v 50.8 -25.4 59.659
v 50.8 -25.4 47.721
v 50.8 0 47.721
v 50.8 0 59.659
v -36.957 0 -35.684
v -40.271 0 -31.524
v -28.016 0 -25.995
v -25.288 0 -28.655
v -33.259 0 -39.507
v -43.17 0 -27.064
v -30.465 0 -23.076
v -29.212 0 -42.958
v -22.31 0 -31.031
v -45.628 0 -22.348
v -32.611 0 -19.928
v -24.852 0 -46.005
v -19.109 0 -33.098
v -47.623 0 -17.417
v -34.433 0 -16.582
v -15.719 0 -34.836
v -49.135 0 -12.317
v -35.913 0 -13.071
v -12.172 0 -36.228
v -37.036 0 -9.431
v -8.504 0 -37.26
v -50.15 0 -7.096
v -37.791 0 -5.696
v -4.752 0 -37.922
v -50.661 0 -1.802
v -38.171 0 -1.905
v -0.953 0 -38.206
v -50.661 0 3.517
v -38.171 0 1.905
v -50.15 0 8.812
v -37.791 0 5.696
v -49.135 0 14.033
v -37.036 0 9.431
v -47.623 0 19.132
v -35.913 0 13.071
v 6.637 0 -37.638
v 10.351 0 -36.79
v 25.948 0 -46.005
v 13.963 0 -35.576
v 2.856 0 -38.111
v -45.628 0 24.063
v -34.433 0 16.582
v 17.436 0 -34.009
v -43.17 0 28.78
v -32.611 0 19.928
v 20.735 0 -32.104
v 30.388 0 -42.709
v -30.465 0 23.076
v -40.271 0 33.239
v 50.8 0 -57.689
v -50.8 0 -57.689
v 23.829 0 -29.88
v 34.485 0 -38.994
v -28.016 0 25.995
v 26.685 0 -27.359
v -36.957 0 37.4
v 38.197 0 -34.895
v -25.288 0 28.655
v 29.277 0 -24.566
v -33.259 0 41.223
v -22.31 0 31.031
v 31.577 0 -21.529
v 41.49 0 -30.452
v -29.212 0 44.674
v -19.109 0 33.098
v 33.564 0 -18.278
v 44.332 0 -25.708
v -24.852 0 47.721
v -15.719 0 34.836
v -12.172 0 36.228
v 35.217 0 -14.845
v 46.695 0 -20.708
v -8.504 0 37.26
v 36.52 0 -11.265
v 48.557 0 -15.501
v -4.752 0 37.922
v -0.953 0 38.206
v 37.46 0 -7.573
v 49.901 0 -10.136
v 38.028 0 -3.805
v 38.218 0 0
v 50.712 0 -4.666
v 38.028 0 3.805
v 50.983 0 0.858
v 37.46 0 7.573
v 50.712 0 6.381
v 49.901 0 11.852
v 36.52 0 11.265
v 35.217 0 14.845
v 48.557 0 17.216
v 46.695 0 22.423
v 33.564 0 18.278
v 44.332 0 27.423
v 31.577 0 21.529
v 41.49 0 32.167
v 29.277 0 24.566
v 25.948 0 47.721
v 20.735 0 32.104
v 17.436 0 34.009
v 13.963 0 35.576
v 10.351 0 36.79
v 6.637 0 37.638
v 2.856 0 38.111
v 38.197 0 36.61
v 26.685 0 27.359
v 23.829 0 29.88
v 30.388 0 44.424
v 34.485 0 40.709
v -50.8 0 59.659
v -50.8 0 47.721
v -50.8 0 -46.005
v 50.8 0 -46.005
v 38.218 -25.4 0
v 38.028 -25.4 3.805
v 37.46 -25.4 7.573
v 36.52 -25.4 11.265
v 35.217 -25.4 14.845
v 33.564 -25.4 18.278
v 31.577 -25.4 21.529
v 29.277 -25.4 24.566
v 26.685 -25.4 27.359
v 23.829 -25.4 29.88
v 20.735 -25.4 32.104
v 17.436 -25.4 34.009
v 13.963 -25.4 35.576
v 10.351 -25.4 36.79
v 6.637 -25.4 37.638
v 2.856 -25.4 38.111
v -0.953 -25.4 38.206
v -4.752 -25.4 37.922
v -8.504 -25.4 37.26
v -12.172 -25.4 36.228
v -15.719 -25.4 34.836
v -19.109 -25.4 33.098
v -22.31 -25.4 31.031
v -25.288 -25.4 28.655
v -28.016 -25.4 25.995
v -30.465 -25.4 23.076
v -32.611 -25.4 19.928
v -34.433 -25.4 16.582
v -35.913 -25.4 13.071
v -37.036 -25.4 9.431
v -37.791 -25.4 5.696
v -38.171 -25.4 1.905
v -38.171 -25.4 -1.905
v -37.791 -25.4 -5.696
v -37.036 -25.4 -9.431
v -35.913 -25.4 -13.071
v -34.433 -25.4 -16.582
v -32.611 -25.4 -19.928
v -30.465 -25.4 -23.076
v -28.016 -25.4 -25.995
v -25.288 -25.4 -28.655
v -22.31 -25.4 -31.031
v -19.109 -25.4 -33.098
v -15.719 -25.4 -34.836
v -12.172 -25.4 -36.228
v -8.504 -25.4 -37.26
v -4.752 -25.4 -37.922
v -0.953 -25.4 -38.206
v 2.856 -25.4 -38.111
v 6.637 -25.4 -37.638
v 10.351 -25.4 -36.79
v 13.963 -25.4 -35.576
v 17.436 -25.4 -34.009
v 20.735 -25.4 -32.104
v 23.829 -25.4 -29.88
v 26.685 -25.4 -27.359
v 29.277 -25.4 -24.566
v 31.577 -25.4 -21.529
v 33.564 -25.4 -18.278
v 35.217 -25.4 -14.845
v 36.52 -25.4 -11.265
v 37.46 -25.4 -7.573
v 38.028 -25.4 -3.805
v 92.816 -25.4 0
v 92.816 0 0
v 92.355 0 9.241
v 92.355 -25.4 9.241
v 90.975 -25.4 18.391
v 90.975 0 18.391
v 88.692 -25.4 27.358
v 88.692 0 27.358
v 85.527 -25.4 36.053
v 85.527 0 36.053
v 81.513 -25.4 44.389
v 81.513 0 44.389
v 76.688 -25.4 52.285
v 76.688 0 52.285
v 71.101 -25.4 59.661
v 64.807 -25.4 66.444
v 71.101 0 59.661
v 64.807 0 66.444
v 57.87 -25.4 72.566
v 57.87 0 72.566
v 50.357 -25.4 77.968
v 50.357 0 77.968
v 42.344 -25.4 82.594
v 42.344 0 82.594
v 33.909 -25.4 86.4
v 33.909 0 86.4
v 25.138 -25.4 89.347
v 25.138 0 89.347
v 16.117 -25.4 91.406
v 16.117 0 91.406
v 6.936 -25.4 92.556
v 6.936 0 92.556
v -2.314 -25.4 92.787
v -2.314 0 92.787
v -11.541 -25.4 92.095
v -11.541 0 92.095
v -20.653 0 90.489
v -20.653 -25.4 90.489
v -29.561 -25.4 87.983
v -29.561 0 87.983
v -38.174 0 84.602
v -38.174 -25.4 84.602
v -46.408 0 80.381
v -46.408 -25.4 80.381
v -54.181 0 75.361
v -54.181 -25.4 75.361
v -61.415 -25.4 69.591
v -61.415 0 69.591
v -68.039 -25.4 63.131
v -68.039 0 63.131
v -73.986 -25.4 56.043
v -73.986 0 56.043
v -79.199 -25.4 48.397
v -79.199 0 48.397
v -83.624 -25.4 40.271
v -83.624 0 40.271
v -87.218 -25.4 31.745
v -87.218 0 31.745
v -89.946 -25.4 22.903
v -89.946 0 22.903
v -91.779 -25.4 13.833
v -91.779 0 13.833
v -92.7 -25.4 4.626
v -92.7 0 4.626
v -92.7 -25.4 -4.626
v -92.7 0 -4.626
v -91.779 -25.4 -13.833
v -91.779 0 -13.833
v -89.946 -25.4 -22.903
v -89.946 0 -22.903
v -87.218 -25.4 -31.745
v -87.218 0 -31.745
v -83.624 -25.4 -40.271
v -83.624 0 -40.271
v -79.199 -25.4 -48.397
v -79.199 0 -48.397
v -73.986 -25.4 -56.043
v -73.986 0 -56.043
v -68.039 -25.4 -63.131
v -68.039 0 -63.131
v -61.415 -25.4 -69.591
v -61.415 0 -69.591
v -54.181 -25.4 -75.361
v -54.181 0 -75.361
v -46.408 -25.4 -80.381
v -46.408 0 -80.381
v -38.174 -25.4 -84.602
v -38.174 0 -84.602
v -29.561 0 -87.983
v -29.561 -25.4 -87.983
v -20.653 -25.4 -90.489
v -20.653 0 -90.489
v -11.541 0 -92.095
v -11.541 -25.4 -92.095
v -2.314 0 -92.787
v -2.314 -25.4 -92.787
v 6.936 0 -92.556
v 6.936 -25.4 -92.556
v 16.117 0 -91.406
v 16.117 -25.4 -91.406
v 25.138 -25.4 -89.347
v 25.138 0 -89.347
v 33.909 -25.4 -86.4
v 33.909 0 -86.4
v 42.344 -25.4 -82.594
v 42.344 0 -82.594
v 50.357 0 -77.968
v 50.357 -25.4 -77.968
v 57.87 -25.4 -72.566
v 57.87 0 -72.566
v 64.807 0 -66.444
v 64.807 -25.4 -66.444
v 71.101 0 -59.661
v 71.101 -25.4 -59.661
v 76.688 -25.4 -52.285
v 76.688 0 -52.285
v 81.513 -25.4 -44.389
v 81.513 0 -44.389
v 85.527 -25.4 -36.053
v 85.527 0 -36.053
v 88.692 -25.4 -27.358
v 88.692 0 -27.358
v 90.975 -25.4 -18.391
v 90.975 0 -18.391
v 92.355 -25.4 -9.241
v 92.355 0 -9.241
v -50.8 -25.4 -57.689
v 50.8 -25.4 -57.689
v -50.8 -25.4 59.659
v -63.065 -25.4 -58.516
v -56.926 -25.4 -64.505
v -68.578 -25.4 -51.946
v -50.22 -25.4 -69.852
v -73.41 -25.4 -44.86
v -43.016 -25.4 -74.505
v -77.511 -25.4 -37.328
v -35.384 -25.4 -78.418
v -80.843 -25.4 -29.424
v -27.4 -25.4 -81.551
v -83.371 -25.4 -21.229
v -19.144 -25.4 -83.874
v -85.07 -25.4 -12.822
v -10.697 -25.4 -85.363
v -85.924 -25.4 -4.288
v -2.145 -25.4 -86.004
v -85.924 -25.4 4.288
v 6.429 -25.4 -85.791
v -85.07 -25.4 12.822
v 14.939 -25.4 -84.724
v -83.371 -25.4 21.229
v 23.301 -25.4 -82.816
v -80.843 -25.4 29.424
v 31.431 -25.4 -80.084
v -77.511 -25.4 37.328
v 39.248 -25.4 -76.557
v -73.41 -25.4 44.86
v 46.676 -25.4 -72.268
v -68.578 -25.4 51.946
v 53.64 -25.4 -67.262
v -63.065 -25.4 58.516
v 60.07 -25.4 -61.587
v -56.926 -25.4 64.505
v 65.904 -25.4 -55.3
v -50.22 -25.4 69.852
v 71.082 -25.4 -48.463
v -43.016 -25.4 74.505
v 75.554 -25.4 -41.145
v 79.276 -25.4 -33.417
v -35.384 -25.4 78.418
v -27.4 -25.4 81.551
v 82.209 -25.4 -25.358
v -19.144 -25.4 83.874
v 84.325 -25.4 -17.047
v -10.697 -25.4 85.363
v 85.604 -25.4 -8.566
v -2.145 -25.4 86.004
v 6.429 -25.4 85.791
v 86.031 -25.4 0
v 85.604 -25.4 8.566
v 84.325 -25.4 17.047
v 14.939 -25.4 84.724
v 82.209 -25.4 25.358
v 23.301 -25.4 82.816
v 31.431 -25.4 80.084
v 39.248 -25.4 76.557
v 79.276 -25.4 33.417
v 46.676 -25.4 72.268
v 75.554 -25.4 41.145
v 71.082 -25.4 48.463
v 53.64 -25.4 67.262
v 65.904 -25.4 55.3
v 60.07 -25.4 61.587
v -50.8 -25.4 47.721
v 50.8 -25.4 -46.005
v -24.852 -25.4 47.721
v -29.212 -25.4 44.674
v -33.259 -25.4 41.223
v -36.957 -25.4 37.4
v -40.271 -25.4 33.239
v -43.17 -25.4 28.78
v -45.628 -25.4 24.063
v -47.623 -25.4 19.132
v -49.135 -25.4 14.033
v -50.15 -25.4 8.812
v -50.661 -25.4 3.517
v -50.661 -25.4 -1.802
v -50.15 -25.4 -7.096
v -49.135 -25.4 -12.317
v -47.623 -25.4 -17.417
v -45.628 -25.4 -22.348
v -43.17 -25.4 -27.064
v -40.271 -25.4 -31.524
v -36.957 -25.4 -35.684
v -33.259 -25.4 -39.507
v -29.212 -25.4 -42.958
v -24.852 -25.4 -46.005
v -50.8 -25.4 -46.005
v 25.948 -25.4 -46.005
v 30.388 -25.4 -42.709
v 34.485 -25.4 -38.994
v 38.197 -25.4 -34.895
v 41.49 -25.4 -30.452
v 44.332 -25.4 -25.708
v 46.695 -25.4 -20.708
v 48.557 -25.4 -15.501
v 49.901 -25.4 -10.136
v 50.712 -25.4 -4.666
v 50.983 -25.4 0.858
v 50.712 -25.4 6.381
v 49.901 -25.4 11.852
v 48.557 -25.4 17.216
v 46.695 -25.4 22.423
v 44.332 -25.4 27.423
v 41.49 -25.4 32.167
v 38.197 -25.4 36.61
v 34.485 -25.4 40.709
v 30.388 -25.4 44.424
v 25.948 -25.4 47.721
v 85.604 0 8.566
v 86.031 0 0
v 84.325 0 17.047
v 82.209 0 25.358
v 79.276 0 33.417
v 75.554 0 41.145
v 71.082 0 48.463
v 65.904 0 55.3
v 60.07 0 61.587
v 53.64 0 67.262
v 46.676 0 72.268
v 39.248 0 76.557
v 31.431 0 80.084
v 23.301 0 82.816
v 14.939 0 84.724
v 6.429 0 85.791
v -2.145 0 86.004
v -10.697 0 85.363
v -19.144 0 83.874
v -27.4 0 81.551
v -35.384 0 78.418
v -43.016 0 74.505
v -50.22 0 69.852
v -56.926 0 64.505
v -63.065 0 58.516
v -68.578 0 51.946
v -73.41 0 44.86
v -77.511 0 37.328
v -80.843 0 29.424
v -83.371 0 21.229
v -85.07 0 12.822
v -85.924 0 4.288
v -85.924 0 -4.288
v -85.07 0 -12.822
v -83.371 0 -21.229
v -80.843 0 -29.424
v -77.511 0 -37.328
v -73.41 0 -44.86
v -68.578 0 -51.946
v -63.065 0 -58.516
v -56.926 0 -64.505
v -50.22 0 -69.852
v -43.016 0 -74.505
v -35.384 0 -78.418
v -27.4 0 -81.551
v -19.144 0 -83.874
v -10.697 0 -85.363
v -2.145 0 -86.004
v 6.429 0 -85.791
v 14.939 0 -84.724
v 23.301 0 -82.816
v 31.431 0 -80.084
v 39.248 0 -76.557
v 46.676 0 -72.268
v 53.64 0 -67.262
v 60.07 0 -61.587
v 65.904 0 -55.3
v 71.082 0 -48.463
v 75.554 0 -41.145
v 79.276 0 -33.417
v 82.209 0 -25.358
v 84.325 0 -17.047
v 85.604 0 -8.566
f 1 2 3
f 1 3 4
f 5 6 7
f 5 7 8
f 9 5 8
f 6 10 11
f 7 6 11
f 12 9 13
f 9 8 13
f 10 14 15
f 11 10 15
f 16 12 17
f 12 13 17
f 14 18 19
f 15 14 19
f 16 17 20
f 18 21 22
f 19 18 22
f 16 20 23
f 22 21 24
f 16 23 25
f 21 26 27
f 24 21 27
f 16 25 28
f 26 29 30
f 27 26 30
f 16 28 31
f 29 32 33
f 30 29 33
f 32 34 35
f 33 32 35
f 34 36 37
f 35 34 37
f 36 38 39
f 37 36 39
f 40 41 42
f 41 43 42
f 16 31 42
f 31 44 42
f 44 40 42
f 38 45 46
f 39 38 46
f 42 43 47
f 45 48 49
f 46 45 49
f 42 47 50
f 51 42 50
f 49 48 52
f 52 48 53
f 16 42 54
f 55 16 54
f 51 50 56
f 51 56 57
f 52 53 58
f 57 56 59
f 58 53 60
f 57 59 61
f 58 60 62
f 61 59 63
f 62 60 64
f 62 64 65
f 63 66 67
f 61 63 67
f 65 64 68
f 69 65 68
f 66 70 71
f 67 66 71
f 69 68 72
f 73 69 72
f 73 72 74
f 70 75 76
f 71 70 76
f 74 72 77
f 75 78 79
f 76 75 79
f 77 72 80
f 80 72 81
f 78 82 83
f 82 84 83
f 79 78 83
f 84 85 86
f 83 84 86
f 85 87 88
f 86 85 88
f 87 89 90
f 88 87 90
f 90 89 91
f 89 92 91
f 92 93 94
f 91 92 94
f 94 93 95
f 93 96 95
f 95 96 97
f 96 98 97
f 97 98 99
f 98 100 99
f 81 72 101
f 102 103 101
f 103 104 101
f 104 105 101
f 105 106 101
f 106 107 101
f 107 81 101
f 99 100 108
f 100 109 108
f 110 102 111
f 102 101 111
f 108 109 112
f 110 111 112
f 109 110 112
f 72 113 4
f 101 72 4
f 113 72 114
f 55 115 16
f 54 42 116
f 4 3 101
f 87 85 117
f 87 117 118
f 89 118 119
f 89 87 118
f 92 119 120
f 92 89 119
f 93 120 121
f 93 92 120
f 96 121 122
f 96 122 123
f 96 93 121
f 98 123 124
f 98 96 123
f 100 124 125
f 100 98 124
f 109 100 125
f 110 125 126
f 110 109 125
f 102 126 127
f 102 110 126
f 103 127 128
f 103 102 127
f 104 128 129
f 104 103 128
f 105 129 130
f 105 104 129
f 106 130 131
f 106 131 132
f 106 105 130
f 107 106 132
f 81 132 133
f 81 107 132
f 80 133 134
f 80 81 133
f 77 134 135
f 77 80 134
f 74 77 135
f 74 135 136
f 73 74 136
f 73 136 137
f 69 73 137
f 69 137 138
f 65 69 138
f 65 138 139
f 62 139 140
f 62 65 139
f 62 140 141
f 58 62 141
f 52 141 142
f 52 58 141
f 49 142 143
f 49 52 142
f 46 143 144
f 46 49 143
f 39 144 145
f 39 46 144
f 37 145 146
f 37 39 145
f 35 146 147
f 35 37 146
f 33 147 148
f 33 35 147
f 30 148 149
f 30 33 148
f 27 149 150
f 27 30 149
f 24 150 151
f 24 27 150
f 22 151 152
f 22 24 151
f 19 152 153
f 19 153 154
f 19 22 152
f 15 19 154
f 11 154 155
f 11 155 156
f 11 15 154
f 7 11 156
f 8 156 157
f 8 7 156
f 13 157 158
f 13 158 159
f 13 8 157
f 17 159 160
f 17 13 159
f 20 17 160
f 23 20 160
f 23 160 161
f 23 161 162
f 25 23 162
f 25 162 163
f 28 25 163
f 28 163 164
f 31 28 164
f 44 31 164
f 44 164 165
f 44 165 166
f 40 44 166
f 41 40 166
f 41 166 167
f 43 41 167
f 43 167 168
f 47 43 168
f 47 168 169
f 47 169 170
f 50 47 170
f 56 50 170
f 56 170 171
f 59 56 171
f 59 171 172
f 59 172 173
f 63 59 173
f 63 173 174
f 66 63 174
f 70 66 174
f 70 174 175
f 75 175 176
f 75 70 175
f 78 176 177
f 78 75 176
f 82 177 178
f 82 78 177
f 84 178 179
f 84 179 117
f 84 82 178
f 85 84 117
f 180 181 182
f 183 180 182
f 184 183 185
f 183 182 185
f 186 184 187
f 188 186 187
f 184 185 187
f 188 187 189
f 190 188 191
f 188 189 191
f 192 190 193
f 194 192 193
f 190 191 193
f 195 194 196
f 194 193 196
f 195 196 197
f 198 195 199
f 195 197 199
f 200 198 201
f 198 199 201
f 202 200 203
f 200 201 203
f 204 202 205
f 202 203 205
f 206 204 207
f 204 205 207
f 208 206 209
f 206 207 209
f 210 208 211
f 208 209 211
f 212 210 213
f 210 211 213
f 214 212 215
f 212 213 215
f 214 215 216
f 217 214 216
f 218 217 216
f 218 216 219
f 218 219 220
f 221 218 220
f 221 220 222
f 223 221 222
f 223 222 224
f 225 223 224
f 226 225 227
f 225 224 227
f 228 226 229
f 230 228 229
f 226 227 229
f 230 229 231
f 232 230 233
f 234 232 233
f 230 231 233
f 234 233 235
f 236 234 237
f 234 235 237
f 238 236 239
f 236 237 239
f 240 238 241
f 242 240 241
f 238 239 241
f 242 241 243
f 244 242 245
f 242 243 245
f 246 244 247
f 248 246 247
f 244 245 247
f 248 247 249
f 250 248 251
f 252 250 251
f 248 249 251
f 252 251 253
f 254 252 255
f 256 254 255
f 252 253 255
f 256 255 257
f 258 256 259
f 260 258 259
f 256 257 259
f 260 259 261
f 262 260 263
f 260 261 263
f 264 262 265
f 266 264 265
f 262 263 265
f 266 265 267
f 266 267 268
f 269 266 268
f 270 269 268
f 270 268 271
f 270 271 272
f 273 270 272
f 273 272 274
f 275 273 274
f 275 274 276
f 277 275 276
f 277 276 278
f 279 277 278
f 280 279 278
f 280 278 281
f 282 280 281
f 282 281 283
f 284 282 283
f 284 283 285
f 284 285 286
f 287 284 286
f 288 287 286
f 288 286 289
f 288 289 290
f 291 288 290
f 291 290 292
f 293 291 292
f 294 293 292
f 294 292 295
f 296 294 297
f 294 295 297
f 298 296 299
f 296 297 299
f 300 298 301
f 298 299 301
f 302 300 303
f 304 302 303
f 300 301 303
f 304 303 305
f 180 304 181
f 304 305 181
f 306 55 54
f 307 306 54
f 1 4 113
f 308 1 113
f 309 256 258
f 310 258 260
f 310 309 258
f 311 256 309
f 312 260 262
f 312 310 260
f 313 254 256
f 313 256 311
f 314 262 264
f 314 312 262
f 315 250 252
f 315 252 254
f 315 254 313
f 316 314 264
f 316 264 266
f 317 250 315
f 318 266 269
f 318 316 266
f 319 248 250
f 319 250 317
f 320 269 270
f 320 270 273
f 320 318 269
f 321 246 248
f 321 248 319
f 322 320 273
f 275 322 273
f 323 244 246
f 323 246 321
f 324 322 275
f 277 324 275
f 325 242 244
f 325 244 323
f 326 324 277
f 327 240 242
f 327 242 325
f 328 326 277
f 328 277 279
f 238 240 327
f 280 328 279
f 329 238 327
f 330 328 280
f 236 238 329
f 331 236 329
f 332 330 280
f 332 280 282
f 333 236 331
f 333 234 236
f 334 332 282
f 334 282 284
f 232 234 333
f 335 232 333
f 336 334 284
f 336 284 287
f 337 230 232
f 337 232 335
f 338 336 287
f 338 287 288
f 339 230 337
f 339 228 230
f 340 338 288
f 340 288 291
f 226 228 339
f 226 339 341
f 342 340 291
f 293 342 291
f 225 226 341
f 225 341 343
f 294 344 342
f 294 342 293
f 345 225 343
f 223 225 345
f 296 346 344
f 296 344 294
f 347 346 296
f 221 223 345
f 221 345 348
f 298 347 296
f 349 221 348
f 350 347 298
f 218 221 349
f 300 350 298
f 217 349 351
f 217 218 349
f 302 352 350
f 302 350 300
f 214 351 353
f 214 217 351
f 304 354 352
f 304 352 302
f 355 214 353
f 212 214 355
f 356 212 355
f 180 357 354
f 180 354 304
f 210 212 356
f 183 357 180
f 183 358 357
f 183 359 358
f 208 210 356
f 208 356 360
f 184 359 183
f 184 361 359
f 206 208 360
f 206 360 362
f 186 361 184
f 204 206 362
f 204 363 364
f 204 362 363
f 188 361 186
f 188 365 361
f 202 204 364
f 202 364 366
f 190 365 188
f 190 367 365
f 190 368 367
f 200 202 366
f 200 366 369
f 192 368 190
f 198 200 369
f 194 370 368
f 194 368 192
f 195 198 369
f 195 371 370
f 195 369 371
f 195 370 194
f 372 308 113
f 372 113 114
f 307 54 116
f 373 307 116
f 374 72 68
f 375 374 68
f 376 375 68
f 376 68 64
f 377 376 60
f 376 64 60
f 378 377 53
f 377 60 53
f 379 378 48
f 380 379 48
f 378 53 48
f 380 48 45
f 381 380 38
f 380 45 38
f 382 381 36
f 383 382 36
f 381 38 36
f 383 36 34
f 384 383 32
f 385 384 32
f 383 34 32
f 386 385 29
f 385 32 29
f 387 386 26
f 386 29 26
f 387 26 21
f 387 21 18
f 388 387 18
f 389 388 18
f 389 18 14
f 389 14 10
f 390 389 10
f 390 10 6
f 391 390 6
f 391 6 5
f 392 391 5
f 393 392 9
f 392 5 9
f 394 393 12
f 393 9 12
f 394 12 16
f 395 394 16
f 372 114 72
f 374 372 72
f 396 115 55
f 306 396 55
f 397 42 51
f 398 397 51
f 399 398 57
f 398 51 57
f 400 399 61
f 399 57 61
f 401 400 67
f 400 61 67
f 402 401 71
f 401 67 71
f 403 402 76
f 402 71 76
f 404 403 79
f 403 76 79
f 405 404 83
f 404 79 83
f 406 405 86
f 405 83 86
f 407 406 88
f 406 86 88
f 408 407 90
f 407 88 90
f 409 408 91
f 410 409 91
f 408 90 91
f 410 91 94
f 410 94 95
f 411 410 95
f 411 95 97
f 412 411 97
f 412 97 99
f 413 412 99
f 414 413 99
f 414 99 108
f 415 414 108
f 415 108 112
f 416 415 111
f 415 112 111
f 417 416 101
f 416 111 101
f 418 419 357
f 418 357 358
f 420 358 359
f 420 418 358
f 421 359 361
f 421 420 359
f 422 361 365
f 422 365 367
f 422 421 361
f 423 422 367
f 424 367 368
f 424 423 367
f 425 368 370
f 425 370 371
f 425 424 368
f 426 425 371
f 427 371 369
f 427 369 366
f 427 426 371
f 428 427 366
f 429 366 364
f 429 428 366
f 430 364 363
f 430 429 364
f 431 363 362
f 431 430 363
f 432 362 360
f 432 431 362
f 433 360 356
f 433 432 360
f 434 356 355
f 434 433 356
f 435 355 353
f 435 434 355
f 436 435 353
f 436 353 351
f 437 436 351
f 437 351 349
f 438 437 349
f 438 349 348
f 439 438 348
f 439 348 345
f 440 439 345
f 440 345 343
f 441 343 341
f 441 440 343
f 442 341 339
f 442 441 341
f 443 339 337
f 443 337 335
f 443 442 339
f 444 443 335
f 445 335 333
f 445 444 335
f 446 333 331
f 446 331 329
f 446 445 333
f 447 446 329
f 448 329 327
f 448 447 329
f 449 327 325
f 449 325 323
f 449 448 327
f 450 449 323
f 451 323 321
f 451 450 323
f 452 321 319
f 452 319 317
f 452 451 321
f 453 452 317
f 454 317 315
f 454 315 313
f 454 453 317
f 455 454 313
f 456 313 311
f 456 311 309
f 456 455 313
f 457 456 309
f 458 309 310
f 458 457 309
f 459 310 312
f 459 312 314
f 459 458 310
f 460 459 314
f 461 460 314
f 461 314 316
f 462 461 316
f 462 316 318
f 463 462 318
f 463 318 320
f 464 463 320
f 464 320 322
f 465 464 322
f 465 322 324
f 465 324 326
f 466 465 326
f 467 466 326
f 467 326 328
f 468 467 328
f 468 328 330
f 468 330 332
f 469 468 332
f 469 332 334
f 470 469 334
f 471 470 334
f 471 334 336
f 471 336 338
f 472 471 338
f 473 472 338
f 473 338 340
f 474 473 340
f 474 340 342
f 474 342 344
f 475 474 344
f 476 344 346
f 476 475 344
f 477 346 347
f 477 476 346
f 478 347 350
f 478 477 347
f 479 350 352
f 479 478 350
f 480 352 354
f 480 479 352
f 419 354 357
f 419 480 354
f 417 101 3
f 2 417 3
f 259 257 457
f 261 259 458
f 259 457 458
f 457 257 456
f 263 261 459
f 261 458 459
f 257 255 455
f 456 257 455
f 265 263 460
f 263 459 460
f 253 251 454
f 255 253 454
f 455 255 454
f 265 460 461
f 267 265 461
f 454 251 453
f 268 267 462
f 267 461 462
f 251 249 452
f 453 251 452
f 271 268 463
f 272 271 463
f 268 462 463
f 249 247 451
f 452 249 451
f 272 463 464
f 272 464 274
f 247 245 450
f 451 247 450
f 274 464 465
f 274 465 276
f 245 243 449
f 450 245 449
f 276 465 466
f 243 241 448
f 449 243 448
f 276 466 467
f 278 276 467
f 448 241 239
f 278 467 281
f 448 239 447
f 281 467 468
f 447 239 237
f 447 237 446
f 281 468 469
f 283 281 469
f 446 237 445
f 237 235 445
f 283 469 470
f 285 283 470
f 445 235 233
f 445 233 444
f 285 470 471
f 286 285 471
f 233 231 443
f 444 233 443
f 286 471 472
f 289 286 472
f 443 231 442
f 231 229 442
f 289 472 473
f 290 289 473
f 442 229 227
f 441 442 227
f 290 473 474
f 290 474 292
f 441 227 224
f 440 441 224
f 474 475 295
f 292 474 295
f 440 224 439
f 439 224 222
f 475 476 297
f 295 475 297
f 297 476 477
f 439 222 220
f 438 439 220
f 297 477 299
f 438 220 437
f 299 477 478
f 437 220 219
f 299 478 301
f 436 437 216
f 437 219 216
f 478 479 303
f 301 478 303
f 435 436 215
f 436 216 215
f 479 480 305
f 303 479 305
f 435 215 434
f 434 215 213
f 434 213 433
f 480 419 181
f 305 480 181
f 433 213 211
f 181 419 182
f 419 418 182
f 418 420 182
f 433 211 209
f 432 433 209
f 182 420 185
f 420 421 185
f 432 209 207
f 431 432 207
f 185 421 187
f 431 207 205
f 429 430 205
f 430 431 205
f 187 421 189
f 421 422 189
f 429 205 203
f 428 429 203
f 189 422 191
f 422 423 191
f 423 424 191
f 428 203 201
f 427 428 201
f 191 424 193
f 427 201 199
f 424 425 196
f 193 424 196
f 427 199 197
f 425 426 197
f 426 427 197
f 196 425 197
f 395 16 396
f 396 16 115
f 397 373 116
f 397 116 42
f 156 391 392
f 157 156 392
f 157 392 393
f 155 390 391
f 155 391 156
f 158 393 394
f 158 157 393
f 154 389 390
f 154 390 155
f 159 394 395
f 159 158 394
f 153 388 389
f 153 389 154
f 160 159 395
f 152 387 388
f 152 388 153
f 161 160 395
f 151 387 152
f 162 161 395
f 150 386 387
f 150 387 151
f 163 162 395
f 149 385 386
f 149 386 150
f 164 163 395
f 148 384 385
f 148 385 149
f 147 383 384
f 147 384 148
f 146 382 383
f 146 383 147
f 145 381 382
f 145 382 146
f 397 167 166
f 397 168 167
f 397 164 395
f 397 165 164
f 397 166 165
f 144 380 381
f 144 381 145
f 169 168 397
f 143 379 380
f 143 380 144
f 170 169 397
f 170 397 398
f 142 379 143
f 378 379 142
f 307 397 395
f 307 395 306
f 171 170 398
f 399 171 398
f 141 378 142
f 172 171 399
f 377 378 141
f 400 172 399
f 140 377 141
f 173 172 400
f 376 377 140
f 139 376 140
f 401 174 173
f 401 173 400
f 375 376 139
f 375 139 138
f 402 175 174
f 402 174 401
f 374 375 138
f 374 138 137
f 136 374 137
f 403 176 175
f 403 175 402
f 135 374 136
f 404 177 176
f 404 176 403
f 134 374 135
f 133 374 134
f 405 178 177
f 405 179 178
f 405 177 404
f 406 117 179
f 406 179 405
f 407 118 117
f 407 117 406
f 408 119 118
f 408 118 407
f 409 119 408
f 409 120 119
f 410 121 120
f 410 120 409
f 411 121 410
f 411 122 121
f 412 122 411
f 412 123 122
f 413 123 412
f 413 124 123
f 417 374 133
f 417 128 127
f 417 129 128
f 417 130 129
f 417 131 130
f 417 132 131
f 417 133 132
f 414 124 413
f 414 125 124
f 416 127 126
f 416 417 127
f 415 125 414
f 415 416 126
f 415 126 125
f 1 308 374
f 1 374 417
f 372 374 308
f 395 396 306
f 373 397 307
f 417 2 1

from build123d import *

# Parameters (mm, degrees)
F0_R     = 92.815736
F0_R_2   = 86.031156
F0_R_3   = 38.21813
F1_DEPTH = 25.4


with BuildPart() as f1:
    # F0 (on Front) → F1 (new body)
    with BuildSketch(Plane.XZ):
        Circle(F0_R)
        Circle(F0_R_2, mode=Mode.SUBTRACT)
        with BuildLine():
            Line((50.8, 59.658739), (-50.8, 59.658739))
            Line((-50.8, 59.658739), (-50.8, 47.720739))
            Line((-50.8, 47.720739), (-24.852002, 47.720739))
            ThreePointArc((-24.852002, 47.720739), (-50.724671, 0.857739), (-24.852002, -46.005261))
            Line((-24.852002, -46.005261), (-50.8, -46.005261))
            Line((-50.8, -46.005261), (-50.8, -57.68926))
            Line((-50.8, -57.68926), (50.8, -57.68926))
            Line((50.8, -57.68926), (50.8, -46.005261))
            Line((50.8, -46.005261), (25.947996, -46.005261))
            ThreePointArc((25.947996, -46.005261), (50.98282, 0.857739), (25.947996, 47.720739))
            Line((25.947996, 47.720739), (50.8, 47.720739))
            Line((50.8, 47.720739), (50.8, 59.658739))
        make_face()
        Circle(F0_R_3, mode=Mode.SUBTRACT)
    extrude(amount=F1_DEPTH)


solid = f1.part
